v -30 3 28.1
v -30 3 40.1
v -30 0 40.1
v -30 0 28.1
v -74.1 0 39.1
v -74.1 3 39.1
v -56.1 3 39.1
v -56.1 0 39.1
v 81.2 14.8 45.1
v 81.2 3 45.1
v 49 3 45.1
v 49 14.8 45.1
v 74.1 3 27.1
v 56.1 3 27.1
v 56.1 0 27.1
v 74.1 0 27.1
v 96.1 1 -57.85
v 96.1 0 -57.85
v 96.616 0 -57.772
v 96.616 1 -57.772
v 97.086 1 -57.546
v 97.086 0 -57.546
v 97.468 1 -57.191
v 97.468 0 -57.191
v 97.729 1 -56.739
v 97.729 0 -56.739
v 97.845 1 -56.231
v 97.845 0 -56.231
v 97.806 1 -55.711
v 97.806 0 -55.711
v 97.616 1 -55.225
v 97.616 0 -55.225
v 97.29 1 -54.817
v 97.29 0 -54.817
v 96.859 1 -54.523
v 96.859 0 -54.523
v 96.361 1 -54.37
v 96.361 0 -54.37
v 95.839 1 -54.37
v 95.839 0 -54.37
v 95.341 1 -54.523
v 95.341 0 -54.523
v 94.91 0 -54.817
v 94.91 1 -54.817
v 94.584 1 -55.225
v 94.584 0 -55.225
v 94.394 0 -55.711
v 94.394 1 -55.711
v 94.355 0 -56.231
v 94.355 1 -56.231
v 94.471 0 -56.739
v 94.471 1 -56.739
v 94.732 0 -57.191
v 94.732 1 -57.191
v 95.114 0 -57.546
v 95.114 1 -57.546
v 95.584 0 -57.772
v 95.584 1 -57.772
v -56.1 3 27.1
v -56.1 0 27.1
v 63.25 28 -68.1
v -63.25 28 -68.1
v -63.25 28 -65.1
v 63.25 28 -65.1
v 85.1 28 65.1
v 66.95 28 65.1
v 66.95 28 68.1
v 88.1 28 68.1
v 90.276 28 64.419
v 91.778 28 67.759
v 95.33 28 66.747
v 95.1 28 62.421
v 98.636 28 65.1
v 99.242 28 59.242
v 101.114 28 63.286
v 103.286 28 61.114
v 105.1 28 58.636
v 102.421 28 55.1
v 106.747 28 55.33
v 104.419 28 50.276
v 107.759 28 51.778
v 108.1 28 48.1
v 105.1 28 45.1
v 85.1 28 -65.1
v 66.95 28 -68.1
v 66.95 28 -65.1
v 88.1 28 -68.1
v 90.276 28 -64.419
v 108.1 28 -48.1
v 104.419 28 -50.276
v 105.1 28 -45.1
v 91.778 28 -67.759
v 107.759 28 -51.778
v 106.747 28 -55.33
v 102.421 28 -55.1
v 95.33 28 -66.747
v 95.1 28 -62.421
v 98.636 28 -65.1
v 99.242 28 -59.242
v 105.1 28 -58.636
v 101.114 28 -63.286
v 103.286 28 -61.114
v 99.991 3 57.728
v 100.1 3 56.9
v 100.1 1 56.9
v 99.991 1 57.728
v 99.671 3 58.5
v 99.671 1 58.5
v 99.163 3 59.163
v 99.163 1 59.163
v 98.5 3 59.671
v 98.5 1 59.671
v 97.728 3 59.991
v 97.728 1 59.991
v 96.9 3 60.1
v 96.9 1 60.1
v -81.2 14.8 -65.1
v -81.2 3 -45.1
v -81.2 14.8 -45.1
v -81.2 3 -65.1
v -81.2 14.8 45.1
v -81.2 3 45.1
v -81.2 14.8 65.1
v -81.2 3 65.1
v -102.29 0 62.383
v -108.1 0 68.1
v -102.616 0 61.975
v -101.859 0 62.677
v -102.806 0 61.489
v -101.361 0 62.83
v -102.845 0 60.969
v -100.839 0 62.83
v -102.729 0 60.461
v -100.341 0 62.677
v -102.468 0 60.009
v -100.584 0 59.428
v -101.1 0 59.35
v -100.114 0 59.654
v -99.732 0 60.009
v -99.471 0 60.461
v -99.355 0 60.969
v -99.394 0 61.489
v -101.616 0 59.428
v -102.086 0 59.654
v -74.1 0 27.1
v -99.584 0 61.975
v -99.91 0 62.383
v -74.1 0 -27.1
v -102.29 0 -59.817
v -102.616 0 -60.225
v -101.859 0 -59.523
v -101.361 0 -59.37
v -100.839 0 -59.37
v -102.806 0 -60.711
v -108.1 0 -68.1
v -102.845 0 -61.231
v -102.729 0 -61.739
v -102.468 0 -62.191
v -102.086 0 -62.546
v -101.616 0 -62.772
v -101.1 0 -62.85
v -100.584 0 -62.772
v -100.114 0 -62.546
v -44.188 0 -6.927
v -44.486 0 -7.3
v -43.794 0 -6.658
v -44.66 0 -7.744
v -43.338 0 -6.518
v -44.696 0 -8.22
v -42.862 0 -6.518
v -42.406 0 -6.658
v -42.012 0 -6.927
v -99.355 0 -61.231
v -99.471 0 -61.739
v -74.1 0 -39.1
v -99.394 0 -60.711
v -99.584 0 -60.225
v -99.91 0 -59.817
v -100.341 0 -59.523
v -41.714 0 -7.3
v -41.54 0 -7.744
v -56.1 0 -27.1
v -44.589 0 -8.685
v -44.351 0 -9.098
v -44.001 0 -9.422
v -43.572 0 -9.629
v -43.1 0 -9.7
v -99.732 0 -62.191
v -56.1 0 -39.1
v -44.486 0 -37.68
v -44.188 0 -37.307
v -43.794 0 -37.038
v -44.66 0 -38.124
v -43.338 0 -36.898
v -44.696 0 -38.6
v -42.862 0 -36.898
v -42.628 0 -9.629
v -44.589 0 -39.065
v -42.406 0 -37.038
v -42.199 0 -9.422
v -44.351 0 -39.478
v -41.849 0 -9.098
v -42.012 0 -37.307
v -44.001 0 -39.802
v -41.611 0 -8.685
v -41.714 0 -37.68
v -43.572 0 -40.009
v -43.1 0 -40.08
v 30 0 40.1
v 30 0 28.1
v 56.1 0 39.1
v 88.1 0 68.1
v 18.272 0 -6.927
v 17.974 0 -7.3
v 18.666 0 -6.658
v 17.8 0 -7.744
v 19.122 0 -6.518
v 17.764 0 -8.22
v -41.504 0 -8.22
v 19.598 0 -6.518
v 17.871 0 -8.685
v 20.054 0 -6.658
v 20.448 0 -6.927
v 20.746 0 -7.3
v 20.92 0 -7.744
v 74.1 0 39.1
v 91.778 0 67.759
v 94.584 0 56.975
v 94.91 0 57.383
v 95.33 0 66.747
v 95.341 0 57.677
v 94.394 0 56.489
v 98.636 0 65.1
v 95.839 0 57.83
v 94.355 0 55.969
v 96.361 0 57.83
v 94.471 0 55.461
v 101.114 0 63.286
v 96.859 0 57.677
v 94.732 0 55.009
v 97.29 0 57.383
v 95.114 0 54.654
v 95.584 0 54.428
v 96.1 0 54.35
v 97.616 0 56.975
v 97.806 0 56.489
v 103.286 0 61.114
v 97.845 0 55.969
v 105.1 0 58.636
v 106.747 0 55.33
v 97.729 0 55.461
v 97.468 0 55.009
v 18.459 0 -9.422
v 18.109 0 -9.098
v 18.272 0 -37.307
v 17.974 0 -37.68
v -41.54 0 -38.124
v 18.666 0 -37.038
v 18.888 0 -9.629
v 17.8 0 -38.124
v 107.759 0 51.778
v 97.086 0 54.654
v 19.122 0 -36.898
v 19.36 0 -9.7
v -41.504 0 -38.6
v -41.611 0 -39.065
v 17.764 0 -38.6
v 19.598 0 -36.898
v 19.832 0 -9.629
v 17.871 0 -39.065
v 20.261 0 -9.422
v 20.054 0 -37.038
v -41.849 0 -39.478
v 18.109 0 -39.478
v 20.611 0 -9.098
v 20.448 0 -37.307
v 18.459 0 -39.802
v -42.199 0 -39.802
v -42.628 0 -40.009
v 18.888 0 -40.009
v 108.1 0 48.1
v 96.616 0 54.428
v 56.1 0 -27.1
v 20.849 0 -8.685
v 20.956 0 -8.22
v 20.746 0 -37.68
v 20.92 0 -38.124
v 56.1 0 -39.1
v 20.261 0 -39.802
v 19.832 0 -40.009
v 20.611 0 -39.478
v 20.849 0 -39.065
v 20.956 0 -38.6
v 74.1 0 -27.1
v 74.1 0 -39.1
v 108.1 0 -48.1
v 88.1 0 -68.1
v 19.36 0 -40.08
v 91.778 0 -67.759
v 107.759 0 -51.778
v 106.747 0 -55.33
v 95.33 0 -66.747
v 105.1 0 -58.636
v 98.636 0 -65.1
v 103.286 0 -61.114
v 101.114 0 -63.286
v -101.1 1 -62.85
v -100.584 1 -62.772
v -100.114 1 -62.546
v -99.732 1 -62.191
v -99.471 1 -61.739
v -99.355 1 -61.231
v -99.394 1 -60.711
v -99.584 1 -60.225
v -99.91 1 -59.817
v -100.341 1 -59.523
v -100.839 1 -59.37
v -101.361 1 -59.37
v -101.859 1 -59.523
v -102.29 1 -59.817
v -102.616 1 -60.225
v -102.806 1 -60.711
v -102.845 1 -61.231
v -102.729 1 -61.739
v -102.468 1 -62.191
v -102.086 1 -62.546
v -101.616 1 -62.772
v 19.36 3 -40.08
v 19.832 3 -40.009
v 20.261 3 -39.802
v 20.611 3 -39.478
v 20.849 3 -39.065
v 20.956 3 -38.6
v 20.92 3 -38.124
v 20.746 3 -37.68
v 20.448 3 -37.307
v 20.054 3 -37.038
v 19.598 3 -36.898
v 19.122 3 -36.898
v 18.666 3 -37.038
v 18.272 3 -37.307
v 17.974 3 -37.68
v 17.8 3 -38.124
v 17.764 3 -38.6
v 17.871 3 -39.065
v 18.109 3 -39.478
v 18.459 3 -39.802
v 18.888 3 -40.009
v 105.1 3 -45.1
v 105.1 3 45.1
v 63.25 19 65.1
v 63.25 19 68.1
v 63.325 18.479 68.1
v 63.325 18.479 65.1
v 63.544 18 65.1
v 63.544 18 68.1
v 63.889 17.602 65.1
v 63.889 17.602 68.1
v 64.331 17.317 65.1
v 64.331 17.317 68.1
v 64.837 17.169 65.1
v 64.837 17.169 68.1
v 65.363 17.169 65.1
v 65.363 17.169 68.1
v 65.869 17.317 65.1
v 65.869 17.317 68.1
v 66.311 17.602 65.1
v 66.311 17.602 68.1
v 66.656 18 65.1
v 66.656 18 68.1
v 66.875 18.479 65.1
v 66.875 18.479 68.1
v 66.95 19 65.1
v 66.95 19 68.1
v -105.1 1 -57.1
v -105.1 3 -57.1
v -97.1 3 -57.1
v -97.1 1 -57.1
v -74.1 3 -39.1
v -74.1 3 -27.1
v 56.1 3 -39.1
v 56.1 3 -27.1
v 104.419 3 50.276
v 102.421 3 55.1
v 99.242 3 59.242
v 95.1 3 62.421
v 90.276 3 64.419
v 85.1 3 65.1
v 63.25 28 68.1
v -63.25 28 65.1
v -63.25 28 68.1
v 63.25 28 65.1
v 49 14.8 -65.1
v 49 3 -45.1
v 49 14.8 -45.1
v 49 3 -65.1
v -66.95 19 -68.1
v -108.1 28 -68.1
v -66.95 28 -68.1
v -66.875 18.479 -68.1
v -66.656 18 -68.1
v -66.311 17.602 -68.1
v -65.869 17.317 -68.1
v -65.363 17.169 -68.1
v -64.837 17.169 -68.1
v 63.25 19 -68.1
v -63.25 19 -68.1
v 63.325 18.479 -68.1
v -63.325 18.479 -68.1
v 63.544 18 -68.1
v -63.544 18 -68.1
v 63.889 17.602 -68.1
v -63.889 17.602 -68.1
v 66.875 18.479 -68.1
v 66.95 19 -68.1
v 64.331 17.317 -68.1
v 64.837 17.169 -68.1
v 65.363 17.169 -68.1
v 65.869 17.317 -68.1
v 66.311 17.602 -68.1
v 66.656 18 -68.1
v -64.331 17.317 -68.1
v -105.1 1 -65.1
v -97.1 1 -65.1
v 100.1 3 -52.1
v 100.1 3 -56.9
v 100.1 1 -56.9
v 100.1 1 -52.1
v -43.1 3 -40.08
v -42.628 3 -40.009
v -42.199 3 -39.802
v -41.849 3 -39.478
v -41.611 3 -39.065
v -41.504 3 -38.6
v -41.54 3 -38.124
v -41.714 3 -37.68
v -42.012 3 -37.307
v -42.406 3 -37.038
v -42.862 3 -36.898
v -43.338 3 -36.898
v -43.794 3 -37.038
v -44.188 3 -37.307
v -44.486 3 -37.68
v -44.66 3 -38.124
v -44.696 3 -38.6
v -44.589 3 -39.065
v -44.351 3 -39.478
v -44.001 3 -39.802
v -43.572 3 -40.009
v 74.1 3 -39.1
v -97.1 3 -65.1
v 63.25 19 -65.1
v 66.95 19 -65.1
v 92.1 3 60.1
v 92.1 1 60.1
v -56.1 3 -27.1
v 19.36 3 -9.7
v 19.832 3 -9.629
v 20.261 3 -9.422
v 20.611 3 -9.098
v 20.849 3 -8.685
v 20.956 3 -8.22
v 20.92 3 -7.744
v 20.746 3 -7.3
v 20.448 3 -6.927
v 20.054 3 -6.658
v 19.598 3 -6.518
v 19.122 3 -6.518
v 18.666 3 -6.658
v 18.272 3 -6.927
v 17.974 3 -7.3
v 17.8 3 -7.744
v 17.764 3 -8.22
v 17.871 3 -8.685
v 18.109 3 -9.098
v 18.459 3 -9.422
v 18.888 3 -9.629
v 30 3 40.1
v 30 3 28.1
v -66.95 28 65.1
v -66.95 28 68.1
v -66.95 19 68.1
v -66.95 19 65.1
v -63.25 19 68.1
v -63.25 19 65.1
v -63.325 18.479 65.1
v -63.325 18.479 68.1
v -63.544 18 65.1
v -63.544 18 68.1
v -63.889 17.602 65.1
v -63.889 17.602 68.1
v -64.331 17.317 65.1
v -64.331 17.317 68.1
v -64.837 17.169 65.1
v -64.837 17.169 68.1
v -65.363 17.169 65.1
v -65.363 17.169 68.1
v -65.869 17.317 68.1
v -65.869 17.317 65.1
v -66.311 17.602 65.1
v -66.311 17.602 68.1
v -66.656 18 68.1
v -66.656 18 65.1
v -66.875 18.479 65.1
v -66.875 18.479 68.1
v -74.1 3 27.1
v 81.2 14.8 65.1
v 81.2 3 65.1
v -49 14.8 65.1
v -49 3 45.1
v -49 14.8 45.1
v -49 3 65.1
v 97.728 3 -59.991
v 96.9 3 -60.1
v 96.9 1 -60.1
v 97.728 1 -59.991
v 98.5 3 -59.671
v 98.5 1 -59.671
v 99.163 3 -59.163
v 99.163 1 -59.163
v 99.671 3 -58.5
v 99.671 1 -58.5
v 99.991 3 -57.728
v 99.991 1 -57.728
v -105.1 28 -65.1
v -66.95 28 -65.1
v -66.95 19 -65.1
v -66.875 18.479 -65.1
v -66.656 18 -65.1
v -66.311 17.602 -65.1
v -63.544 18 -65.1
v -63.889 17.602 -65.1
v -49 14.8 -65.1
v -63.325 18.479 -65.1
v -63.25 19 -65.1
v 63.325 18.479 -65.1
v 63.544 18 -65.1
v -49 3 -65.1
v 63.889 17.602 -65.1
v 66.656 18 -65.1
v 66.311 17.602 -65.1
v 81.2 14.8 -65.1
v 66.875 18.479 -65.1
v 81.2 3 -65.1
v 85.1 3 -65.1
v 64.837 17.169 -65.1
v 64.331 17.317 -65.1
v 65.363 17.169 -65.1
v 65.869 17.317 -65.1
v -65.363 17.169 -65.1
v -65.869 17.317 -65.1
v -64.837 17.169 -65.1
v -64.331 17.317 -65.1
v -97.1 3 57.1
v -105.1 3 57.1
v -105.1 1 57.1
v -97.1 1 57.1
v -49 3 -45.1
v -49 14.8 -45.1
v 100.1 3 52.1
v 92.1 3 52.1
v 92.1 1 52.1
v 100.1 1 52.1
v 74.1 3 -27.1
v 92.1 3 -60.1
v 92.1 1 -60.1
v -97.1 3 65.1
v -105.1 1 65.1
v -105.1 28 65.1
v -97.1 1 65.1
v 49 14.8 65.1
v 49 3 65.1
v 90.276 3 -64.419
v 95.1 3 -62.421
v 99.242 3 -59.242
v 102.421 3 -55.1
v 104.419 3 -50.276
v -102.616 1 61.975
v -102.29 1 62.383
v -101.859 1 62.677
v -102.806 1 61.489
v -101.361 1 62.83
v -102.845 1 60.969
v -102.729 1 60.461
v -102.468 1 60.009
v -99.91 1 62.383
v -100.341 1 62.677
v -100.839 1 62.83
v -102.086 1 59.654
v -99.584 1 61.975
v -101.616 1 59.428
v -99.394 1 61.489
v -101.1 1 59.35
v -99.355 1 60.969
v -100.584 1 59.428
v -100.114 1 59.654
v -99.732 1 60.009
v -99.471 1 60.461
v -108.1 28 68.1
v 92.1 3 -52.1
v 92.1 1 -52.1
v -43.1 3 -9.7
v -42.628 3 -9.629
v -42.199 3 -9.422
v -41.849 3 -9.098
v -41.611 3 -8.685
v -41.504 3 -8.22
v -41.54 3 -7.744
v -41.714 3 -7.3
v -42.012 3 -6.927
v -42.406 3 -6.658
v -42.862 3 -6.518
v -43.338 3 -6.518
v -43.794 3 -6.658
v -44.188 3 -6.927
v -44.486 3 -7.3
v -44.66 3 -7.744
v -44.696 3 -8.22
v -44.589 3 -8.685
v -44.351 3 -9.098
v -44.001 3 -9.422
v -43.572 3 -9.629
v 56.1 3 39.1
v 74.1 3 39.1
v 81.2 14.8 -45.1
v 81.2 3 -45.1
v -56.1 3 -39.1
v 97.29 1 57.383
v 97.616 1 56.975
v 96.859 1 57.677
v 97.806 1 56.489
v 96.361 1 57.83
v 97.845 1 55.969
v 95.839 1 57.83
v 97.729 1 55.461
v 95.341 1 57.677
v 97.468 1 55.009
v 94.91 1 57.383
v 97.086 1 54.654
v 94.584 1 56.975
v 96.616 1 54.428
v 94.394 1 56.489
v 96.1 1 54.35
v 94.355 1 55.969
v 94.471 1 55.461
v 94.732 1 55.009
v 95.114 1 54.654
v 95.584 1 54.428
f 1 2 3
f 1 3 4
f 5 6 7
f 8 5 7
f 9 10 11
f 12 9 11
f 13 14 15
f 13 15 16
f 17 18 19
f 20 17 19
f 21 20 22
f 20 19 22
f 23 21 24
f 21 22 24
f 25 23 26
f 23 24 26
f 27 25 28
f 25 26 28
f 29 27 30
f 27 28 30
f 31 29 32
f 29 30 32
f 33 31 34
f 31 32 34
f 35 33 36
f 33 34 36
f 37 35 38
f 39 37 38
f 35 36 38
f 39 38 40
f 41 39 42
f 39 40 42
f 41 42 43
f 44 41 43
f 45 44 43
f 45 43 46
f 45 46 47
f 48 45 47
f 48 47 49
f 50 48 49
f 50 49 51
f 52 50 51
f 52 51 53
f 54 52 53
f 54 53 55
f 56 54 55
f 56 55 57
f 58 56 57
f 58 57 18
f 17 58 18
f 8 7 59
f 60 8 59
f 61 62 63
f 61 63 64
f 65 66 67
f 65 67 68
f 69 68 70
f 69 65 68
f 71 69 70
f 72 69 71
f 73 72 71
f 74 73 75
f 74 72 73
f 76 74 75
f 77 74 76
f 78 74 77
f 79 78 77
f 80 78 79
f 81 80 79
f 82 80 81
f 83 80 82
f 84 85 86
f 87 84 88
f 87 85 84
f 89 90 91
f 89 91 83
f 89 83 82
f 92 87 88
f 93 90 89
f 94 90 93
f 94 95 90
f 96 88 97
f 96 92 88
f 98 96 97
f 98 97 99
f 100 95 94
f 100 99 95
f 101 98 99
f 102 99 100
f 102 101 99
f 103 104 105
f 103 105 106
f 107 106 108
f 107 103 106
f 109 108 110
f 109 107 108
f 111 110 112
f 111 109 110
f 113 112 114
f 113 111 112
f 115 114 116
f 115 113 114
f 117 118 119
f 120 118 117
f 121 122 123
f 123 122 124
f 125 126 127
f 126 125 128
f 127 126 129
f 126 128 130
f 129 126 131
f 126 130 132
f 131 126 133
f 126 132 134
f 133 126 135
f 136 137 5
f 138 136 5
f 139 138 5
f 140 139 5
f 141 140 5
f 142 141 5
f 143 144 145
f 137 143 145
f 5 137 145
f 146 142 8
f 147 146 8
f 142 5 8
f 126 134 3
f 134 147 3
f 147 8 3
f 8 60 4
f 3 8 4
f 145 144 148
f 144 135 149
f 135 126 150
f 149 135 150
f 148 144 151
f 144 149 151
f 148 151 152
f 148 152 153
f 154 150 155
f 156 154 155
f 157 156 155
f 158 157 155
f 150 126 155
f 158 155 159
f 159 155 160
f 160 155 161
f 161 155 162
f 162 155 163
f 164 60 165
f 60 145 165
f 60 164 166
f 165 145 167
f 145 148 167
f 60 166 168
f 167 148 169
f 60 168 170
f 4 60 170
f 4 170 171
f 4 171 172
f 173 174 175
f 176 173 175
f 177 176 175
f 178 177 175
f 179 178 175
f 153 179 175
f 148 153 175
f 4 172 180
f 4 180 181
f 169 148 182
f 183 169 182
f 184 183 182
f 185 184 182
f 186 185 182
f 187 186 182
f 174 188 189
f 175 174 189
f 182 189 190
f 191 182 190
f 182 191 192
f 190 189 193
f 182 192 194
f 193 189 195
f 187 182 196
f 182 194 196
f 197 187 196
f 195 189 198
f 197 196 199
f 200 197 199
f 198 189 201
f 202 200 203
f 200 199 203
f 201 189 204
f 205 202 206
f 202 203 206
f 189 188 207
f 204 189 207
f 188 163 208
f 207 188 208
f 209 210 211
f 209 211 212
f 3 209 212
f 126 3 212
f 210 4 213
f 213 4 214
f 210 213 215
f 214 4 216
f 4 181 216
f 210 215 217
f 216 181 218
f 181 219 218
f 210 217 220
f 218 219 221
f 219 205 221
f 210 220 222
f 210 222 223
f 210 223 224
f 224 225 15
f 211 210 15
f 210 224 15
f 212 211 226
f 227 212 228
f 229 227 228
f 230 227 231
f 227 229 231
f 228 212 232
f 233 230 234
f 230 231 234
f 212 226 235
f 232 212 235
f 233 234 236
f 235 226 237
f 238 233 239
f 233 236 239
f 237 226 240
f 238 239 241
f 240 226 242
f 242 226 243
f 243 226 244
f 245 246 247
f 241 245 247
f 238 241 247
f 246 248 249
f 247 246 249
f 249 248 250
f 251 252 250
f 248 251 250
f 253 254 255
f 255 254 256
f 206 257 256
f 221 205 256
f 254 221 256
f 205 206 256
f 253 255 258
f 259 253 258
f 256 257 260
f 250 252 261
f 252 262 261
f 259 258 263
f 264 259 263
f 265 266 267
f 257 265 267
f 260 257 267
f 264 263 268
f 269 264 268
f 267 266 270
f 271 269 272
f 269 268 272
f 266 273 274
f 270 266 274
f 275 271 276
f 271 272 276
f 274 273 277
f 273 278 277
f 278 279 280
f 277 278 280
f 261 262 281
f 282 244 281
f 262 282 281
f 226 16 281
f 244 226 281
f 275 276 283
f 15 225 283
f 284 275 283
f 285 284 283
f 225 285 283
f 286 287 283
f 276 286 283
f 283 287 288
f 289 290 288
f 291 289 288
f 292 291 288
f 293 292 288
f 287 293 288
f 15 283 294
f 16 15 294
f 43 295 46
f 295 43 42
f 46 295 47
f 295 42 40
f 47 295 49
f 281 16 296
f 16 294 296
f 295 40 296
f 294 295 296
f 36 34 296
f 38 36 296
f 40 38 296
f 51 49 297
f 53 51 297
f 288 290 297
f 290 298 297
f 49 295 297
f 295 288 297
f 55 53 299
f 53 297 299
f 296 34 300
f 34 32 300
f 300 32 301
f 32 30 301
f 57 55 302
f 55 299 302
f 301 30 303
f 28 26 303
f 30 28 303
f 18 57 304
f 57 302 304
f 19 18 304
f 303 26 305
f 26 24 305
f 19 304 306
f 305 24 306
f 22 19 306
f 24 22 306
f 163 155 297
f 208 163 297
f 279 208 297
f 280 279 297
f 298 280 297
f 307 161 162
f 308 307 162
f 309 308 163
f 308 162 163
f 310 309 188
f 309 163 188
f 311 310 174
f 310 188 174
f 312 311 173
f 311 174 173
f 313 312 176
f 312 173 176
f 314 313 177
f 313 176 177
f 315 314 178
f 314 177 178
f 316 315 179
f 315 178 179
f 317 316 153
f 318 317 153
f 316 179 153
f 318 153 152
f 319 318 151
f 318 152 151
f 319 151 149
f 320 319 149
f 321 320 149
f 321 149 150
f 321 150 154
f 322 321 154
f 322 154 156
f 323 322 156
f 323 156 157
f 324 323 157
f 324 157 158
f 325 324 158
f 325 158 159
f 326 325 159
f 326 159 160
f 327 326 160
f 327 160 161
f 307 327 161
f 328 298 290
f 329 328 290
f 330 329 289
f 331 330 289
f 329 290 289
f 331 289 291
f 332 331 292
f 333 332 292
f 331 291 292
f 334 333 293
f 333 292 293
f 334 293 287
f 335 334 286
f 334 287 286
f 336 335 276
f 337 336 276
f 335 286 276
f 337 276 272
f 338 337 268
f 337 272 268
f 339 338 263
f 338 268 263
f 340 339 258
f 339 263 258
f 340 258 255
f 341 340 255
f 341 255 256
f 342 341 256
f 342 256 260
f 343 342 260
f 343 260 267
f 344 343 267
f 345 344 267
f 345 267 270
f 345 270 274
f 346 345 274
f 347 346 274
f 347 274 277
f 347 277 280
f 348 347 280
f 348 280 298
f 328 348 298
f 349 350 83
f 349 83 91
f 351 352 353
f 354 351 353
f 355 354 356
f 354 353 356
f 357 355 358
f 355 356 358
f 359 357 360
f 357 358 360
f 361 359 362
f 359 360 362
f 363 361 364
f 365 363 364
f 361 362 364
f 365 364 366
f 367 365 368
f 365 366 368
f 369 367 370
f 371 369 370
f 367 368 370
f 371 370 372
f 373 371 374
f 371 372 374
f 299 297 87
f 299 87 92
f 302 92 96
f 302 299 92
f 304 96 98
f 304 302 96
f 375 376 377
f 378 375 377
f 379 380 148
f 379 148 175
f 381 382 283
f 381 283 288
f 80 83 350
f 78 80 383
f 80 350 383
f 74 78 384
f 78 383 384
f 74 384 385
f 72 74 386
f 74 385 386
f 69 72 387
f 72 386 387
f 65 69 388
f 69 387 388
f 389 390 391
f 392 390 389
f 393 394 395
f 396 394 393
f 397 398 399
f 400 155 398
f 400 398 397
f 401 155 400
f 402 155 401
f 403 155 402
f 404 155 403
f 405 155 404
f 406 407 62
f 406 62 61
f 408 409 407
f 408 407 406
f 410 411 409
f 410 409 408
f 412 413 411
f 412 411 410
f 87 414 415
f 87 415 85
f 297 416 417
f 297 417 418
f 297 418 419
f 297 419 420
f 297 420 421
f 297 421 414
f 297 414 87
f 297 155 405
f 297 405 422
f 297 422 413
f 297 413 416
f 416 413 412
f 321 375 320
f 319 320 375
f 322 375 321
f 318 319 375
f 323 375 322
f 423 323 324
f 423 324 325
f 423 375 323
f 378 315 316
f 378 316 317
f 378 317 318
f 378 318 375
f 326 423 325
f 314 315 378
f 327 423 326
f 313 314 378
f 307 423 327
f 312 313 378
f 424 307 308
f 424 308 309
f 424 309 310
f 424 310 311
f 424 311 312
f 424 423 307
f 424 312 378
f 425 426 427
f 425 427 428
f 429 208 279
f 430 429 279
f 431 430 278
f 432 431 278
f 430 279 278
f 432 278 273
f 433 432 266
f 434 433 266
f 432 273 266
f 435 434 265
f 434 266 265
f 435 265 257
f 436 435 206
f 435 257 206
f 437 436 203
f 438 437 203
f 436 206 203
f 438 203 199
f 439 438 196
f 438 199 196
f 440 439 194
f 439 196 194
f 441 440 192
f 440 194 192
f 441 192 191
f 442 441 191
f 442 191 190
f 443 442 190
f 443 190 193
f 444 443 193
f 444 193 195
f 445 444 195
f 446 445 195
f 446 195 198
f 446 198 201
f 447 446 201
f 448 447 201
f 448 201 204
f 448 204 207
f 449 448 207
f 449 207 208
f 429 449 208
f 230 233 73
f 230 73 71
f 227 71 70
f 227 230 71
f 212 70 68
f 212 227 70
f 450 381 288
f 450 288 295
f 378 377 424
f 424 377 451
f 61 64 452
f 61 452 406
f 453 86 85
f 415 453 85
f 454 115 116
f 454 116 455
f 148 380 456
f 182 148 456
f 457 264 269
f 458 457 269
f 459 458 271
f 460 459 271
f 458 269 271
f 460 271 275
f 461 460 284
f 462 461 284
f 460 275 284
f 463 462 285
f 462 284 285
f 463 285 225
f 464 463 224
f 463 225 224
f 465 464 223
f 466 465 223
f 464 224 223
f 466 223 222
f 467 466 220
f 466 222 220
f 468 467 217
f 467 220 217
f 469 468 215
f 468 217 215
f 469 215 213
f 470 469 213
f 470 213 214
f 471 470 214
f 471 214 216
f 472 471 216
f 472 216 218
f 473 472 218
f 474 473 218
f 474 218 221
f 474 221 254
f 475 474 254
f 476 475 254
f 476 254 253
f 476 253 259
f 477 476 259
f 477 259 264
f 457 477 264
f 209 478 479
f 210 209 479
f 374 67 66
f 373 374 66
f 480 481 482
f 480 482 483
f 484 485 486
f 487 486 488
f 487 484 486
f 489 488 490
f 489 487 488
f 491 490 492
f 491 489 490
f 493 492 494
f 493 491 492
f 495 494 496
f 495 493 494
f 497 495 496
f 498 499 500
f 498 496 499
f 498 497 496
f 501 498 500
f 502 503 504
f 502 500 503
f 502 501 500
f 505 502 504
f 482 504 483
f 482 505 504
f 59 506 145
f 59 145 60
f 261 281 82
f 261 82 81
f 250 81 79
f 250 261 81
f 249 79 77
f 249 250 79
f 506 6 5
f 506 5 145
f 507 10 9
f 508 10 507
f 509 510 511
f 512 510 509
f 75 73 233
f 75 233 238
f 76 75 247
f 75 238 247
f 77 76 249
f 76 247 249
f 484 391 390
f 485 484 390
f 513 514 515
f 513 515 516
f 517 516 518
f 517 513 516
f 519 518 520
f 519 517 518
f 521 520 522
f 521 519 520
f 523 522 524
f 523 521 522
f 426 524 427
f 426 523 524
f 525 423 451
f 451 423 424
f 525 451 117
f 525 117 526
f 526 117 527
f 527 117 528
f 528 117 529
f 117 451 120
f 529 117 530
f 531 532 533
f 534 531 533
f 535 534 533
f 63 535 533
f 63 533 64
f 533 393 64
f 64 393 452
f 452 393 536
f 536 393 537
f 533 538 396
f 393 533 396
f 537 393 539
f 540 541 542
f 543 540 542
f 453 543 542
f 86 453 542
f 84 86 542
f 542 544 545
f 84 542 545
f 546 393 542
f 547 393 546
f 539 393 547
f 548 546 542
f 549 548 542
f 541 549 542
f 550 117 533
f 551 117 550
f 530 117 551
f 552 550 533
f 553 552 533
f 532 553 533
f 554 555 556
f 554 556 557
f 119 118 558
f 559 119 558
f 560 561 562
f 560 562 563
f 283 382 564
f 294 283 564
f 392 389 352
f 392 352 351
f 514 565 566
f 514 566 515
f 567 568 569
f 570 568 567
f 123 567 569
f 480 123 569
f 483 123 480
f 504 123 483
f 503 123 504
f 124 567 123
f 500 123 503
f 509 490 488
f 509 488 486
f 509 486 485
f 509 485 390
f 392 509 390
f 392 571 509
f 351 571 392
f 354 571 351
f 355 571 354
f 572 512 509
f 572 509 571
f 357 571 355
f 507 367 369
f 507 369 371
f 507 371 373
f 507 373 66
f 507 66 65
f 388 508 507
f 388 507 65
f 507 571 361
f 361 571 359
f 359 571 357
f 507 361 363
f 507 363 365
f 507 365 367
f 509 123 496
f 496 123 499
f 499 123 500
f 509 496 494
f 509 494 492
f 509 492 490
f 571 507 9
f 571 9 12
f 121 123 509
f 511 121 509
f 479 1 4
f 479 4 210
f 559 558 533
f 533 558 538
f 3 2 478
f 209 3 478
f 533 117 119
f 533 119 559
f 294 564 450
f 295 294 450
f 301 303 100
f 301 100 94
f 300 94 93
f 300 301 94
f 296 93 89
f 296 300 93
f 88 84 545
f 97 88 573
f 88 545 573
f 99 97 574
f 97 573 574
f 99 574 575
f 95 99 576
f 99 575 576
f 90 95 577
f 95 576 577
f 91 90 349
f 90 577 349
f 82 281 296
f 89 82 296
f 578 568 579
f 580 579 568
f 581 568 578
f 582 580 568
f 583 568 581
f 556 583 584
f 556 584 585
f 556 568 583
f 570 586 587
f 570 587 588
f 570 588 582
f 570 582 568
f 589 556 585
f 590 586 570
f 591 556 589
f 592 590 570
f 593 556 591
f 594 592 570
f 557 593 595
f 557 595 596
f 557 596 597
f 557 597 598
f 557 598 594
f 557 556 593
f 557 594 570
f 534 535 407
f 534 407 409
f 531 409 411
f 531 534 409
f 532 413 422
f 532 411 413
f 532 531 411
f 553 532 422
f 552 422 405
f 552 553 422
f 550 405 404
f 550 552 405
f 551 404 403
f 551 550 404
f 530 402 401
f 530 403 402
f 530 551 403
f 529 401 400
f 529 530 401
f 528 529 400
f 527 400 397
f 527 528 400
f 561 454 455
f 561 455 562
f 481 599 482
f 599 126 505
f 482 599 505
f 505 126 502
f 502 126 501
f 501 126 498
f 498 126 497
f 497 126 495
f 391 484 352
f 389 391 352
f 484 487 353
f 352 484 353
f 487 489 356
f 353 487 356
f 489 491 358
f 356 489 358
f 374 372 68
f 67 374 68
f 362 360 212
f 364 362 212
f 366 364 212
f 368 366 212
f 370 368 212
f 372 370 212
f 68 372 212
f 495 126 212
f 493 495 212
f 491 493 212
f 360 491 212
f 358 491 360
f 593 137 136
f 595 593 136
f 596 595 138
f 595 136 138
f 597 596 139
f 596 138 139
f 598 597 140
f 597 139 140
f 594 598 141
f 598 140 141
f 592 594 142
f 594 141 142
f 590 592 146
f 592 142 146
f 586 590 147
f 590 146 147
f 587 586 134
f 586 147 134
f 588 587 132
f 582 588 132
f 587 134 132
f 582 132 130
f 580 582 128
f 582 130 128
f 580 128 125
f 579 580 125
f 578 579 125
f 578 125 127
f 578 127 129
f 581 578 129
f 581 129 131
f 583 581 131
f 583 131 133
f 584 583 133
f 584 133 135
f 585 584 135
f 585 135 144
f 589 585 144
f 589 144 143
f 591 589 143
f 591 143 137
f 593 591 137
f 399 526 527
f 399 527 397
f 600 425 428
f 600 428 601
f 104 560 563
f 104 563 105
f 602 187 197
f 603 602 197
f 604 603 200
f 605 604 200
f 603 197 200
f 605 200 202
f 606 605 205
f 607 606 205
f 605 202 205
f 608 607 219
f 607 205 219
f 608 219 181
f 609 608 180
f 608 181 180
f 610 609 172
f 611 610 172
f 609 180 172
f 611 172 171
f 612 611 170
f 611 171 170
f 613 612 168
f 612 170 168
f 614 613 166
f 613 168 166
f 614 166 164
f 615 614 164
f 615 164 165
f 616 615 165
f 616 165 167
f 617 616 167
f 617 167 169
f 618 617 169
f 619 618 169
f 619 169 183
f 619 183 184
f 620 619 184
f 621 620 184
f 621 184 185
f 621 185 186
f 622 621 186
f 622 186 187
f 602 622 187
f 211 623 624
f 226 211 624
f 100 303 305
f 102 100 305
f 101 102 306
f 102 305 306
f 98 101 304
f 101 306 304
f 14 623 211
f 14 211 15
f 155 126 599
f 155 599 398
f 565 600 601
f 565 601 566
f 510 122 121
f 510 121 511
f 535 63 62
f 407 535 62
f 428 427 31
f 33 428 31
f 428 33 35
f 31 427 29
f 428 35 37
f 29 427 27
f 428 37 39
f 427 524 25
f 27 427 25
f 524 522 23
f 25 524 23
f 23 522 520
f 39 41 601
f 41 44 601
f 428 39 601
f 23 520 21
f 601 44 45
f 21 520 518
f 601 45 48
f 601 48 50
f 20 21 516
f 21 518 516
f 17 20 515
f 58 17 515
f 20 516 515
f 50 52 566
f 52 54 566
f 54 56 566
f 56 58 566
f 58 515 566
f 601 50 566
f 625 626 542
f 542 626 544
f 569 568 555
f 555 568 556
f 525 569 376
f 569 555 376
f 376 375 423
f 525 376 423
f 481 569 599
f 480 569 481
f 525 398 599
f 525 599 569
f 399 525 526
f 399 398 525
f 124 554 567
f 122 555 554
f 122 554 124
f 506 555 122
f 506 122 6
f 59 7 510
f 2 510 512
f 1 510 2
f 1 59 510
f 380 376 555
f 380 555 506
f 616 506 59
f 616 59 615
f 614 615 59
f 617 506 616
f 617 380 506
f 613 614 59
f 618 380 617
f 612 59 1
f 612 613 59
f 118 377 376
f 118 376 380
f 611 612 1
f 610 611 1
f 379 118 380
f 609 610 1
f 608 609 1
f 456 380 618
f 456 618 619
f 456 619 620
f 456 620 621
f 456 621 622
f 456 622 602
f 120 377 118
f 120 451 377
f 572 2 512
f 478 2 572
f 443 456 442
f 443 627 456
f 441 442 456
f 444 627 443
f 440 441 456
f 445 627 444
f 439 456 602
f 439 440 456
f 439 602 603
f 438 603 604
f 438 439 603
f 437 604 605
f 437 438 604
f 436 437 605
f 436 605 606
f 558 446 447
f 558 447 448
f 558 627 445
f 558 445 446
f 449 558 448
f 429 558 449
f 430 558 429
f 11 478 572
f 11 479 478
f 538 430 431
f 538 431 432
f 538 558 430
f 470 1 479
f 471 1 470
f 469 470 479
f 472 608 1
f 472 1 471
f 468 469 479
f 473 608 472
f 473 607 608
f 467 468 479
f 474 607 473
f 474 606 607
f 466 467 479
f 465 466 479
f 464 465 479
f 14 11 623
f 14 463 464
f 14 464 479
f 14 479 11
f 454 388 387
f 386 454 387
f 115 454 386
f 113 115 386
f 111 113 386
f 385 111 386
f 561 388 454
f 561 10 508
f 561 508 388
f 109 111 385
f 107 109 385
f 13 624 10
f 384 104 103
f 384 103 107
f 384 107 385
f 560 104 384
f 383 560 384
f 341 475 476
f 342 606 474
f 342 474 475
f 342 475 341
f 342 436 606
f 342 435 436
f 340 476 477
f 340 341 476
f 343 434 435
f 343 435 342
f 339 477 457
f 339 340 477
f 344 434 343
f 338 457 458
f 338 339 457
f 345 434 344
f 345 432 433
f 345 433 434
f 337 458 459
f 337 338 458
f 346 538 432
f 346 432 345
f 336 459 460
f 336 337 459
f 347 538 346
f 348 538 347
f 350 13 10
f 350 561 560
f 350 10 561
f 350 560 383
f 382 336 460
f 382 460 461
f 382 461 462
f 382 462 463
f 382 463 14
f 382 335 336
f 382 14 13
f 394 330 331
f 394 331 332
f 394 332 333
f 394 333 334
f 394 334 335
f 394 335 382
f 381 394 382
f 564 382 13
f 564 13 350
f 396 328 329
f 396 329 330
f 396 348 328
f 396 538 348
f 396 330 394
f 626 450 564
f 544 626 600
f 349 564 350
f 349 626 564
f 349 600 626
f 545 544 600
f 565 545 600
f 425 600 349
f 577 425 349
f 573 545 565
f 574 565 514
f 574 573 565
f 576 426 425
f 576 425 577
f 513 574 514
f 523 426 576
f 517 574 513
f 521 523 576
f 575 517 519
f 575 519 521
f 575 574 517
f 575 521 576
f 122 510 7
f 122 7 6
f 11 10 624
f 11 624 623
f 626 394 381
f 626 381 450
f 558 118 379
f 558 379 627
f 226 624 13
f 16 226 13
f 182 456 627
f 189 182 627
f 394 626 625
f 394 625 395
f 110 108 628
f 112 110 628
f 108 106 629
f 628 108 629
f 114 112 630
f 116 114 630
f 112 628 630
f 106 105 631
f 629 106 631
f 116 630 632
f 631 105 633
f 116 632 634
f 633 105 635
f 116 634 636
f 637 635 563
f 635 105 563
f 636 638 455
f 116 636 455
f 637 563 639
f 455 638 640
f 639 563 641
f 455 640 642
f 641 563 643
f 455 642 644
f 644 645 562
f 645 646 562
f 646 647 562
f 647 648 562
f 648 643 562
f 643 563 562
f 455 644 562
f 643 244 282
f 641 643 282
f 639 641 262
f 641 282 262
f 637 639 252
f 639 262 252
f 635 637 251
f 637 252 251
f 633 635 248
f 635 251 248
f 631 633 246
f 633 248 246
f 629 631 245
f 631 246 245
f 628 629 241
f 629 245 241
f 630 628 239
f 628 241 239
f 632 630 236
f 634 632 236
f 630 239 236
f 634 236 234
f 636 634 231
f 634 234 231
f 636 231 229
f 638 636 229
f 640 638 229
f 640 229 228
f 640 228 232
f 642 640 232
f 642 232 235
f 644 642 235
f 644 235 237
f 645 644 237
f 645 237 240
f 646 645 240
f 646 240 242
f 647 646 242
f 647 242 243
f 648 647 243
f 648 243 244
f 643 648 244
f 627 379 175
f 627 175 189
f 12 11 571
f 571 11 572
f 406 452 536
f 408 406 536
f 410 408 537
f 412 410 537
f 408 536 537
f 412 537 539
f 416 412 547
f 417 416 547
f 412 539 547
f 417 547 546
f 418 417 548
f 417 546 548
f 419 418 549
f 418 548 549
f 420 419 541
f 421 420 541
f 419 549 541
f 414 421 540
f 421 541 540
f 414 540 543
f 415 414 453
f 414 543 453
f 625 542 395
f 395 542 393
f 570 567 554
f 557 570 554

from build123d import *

# Parameters (mm, degrees)
SKETCH1_W                = 210.2
SKETCH1_H                = 130.2
BOSS_EXTRUDE1_DEPTH      = 3
FILLET1_R                = 20
BOSS_EXTRUDE3_DEPTH      = 25
BOSS_EXTRUDE3_DEPTH_BACK = 3
SKETCH2_W                = 216.2
SKETCH2_H                = 136.2
SKETCH2_W_2              = 210.2
SKETCH2_H_2              = 130.2
FILLET2_START            = -1
FILLET2_DEPTH            = 29
FILLET2_2_DEPTH          = 28
SKETCH5_W                = 32.2
SKETCH5_H                = 20
BOSS_EXTRUDE4_DEPTH      = 11.8
MIRROR2_COPY_1_SKETCH_W  = 32.2
MIRROR2_COPY_1_SKETCH_H  = 20
MIRROR2_COPY_1_DEPTH     = 11.8
SKETCH4_W                = 3.7
SKETCH4_H                = 167.196709826
SKETCH4_H_2              = 176.392528866
CUT_EXTRUDE1_DEPTH       = 9
CROQUIS1_R               = 1.75
CORTAR_EXTRUIR1_DEPTH    = 5
CROQUIS2_W               = 18
CROQUIS2_H               = 12
CROQUIS2_W_2             = 60
CORTAR_EXTRUIR2_DEPTH    = 5
CROQUIS3_W               = 8
CROQUIS3_H               = 8
CORTAR_EXTRUIR3_DEPTH    = 2
CORTAR_EXTRUIR4_DEPTH    = 150
CROQUIS5_R               = 1.6
CORTAR_EXTRUIR5_DEPTH    = 10


with BuildPart() as part:
    # Sketch1 → Boss-Extrude1 (new body)
    with BuildSketch(Plane(origin=(0, 0, 0), x_dir=(1, 0, 0), z_dir=(0, 1, 0))):
        Rectangle(SKETCH1_W, SKETCH1_H)
    extrude(amount=BOSS_EXTRUDE1_DEPTH)

    # Fillet1
    fillet1_edges = [part.edges().sort_by_distance(p)[0] for p in [
        (105.1, 1.5, 65.1),
        (105.1, 1.5, -65.1),
    ]]
    fillet(fillet1_edges, radius=FILLET1_R)

    # Sketch2 → Boss-Extrude3 (add, two sides: drawn at the far end of the back side and taken through both)
    with BuildSketch(Plane(origin=(0, 3, 0), x_dir=(1, 0, 0), z_dir=(0, 1, 0)).offset(-BOSS_EXTRUDE3_DEPTH_BACK)):
        Rectangle(SKETCH2_W, SKETCH2_H)
        Rectangle(SKETCH2_W_2, SKETCH2_H_2, mode=Mode.SUBTRACT)
    extrude(amount=BOSS_EXTRUDE3_DEPTH + BOSS_EXTRUDE3_DEPTH_BACK)

    # Fillet2: read off the stored shape, not the designer's step
    # Fillet2 outline → Fillet2 (cut)
    with BuildSketch(Plane(origin=(0, 0, 0), x_dir=(1, 0, 0), z_dir=(0, 1, 0)).offset(FILLET2_START)):
        with BuildLine():
            ThreePointArc((98.635653754, -65.1), (93.577225575, -67.335384062), (88.1, -68.1))
            Line((88.1, -68.1), (108.1, -68.1))
            Line((108.1, -68.1), (108.1, -48.1))
            ThreePointArc((108.1, -48.1), (107.335384062, -53.577225575), (105.1, -58.635653754))
            Line((105.1, -58.635653754), (105.1, -65.1))
            Line((105.1, -65.1), (98.635653754, -65.1))
        make_face()
        with BuildLine():
            ThreePointArc((105.1, 58.635653754), (107.335384062, 53.577225575), (108.1, 48.1))
            Line((108.1, 48.1), (108.1, 68.1))
            Line((108.1, 68.1), (88.1, 68.1))
            ThreePointArc((88.1, 68.1), (93.577225575, 67.335384062), (98.635653754, 65.1))
            Line((98.635653754, 65.1), (105.1, 65.1))
            Line((105.1, 65.1), (105.1, 58.635653754))
        make_face()
    extrude(amount=FILLET2_DEPTH, mode=Mode.SUBTRACT)

    # Fillet2 2 outline → Fillet2 2 (add)
    with BuildSketch(Plane(origin=(0, 0, 0), x_dir=(1, 0, 0), z_dir=(0, 1, 0))):
        with BuildLine():
            Line((85.1, -65.1), (98.635653754, -65.1))
            ThreePointArc((98.635653754, -65.1), (102.242135624, -62.242135624), (105.1, -58.635653754))
            Line((105.1, -58.635653754), (105.1, -45.1))
            ThreePointArc((105.1, -45.1), (99.242135624, -59.242135624), (85.1, -65.1))
        make_face()
        with BuildLine():
            ThreePointArc((85.1, 65.1), (99.242135624, 59.242135624), (105.1, 45.1))
            Line((105.1, 45.1), (105.1, 58.635653754))
            ThreePointArc((105.1, 58.635653754), (102.242135624, 62.242135624), (98.635653754, 65.1))
            Line((98.635653754, 65.1), (85.1, 65.1))
        make_face()
    extrude(amount=FILLET2_2_DEPTH)

    # Sketch5 → Boss-Extrude4 (add)
    with BuildSketch(Plane(origin=(0, 3, 0), x_dir=(1, 0, 0), z_dir=(0, 1, 0))):
        with Locations((-65.1, 55.1)):
            Rectangle(SKETCH5_W, SKETCH5_H)
    boss_extrude4 = extrude(amount=BOSS_EXTRUDE4_DEPTH)

    # Mirror1: Boss-Extrude4 across plane
    add(boss_extrude4.mirror(Plane(origin=(0, 0, 0), x_dir=(0, 0, 1), z_dir=(1, 0, 0))))

    # Mirror2: Boss-Extrude4 across plane
    add(boss_extrude4.mirror(Plane.XY))

    # Mirror2 copy 1 sketch → Mirror2 copy 1 (add)
    with BuildSketch(Plane(origin=(0, 3, 0), x_dir=(-1, 0, 0), z_dir=(0, 1, 0))):
        with Locations((-65.1, 55.1)):
            Rectangle(MIRROR2_COPY_1_SKETCH_W, MIRROR2_COPY_1_SKETCH_H)
    extrude(amount=MIRROR2_COPY_1_DEPTH)

    # Sketch4 → Cut-Extrude1 (cut)
    with BuildSketch(Plane(origin=(0, 28, 0), x_dir=(1, 0, 0), z_dir=(0, 1, 0))):
        with Locations((-65.1, 0)):
            Rectangle(SKETCH4_W, SKETCH4_H)
        with Locations((65.1, 0)):
            Rectangle(SKETCH4_W, SKETCH4_H_2)
    extrude(amount=-CUT_EXTRUDE1_DEPTH, mode=Mode.SUBTRACT)

    # Croquis1 → Cortar-Extruir1 (cut)
    with BuildSketch(Plane.XZ):
        with Locations(Location((-101.1, 61.1, 0), (0, 0, 270))):
            Circle(CROQUIS1_R)
        with Locations(Location((-101.1, -61.1, 0), (0, 0, 270))):
            Circle(CROQUIS1_R)
        with Locations(Location((96.1, 56.1, 0), (0, 0, 270))):
            Circle(CROQUIS1_R)
        with Locations(Location((96.1, -56.1, 0), (0, 0, 270))):
            Circle(CROQUIS1_R)
    extrude(amount=-CORTAR_EXTRUIR1_DEPTH, mode=Mode.SUBTRACT)

    # Croquis2 → Cortar-Extruir2 (cut)
    with BuildSketch(Plane(origin=(0, 3, 0), x_dir=(1, 0, 0), z_dir=(0, 1, 0))):
        with Locations((-65.1, 33.1)):
            Rectangle(CROQUIS2_W, CROQUIS2_H)
        with Locations((-65.1, -33.1)):
            Rectangle(CROQUIS2_W, CROQUIS2_H)
        with Locations((65.1, 33.1)):
            Rectangle(CROQUIS2_W, CROQUIS2_H)
        with Locations((65.1, -33.1)):
            Rectangle(CROQUIS2_W, CROQUIS2_H)
        with Locations((0, -34.1)):
            Rectangle(CROQUIS2_W_2, CROQUIS2_H)
    extrude(amount=-CORTAR_EXTRUIR2_DEPTH, mode=Mode.SUBTRACT)

    # Croquis3 → Cortar-Extruir3 (cut)
    with BuildSketch(Plane(origin=(0, 3, 0), x_dir=(1, 0, 0), z_dir=(0, 1, 0))):
        with BuildLine():
            Line((92.1, 60.1), (96.9, 60.1))
            ThreePointArc((96.9, 60.1), (99.1627417, 59.1627417), (100.1, 56.9))
            Line((100.1, 56.9), (100.1, 52.1))
            Line((100.1, 52.1), (92.1, 52.1))
            Line((92.1, 52.1), (92.1, 60.1))
        make_face()
        with Locations((-101.1, 61.1)):
            Rectangle(CROQUIS3_W, CROQUIS3_H)
        with Locations((-101.1, -61.1)):
            Rectangle(CROQUIS3_W, CROQUIS3_H)
        with BuildLine():
            Line((92.1, -52.1), (100.1, -52.1))
            Line((100.1, -52.1), (100.1, -56.9))
            ThreePointArc((100.1, -56.9), (99.1627417, -59.1627417), (96.9, -60.1))
            Line((96.9, -60.1), (92.1, -60.1))
            Line((92.1, -60.1), (92.1, -52.1))
        make_face()
    extrude(amount=-CORTAR_EXTRUIR3_DEPTH, mode=Mode.SUBTRACT)

    # Croquis4 → Cortar-Extruir4 (cut)
    with BuildSketch(Plane.XY.offset(68.1)):
        with BuildLine():
            Line((-66.95, 19), (-63.25, 19))
            ThreePointArc((-63.25, 19), (-65.1, 17.15), (-66.95, 19))
        make_face()
        with BuildLine():
            Line((66.95, 19), (63.25, 19))
            ThreePointArc((63.25, 19), (65.1, 17.15), (66.95, 19))
        make_face()
    extrude(amount=-CORTAR_EXTRUIR4_DEPTH, mode=Mode.SUBTRACT)

    # Croquis5 → Cortar-Extruir5 (cut)
    with BuildSketch(Plane.XZ):
        with Locations(Location((-43.1, -8.1, 0), (0, 0, 270))):
            Circle(CROQUIS5_R)
        with Locations(Location((-43.1, -38.48, 0), (0, 0, 270))):
            Circle(CROQUIS5_R)
        with Locations(Location((19.36, -8.1, 0), (0, 0, 270))):
            Circle(CROQUIS5_R)
        with Locations(Location((19.36, -38.48, 0), (0, 0, 270))):
            Circle(CROQUIS5_R)
    extrude(amount=-CORTAR_EXTRUIR5_DEPTH, mode=Mode.SUBTRACT)


solid = part.part
